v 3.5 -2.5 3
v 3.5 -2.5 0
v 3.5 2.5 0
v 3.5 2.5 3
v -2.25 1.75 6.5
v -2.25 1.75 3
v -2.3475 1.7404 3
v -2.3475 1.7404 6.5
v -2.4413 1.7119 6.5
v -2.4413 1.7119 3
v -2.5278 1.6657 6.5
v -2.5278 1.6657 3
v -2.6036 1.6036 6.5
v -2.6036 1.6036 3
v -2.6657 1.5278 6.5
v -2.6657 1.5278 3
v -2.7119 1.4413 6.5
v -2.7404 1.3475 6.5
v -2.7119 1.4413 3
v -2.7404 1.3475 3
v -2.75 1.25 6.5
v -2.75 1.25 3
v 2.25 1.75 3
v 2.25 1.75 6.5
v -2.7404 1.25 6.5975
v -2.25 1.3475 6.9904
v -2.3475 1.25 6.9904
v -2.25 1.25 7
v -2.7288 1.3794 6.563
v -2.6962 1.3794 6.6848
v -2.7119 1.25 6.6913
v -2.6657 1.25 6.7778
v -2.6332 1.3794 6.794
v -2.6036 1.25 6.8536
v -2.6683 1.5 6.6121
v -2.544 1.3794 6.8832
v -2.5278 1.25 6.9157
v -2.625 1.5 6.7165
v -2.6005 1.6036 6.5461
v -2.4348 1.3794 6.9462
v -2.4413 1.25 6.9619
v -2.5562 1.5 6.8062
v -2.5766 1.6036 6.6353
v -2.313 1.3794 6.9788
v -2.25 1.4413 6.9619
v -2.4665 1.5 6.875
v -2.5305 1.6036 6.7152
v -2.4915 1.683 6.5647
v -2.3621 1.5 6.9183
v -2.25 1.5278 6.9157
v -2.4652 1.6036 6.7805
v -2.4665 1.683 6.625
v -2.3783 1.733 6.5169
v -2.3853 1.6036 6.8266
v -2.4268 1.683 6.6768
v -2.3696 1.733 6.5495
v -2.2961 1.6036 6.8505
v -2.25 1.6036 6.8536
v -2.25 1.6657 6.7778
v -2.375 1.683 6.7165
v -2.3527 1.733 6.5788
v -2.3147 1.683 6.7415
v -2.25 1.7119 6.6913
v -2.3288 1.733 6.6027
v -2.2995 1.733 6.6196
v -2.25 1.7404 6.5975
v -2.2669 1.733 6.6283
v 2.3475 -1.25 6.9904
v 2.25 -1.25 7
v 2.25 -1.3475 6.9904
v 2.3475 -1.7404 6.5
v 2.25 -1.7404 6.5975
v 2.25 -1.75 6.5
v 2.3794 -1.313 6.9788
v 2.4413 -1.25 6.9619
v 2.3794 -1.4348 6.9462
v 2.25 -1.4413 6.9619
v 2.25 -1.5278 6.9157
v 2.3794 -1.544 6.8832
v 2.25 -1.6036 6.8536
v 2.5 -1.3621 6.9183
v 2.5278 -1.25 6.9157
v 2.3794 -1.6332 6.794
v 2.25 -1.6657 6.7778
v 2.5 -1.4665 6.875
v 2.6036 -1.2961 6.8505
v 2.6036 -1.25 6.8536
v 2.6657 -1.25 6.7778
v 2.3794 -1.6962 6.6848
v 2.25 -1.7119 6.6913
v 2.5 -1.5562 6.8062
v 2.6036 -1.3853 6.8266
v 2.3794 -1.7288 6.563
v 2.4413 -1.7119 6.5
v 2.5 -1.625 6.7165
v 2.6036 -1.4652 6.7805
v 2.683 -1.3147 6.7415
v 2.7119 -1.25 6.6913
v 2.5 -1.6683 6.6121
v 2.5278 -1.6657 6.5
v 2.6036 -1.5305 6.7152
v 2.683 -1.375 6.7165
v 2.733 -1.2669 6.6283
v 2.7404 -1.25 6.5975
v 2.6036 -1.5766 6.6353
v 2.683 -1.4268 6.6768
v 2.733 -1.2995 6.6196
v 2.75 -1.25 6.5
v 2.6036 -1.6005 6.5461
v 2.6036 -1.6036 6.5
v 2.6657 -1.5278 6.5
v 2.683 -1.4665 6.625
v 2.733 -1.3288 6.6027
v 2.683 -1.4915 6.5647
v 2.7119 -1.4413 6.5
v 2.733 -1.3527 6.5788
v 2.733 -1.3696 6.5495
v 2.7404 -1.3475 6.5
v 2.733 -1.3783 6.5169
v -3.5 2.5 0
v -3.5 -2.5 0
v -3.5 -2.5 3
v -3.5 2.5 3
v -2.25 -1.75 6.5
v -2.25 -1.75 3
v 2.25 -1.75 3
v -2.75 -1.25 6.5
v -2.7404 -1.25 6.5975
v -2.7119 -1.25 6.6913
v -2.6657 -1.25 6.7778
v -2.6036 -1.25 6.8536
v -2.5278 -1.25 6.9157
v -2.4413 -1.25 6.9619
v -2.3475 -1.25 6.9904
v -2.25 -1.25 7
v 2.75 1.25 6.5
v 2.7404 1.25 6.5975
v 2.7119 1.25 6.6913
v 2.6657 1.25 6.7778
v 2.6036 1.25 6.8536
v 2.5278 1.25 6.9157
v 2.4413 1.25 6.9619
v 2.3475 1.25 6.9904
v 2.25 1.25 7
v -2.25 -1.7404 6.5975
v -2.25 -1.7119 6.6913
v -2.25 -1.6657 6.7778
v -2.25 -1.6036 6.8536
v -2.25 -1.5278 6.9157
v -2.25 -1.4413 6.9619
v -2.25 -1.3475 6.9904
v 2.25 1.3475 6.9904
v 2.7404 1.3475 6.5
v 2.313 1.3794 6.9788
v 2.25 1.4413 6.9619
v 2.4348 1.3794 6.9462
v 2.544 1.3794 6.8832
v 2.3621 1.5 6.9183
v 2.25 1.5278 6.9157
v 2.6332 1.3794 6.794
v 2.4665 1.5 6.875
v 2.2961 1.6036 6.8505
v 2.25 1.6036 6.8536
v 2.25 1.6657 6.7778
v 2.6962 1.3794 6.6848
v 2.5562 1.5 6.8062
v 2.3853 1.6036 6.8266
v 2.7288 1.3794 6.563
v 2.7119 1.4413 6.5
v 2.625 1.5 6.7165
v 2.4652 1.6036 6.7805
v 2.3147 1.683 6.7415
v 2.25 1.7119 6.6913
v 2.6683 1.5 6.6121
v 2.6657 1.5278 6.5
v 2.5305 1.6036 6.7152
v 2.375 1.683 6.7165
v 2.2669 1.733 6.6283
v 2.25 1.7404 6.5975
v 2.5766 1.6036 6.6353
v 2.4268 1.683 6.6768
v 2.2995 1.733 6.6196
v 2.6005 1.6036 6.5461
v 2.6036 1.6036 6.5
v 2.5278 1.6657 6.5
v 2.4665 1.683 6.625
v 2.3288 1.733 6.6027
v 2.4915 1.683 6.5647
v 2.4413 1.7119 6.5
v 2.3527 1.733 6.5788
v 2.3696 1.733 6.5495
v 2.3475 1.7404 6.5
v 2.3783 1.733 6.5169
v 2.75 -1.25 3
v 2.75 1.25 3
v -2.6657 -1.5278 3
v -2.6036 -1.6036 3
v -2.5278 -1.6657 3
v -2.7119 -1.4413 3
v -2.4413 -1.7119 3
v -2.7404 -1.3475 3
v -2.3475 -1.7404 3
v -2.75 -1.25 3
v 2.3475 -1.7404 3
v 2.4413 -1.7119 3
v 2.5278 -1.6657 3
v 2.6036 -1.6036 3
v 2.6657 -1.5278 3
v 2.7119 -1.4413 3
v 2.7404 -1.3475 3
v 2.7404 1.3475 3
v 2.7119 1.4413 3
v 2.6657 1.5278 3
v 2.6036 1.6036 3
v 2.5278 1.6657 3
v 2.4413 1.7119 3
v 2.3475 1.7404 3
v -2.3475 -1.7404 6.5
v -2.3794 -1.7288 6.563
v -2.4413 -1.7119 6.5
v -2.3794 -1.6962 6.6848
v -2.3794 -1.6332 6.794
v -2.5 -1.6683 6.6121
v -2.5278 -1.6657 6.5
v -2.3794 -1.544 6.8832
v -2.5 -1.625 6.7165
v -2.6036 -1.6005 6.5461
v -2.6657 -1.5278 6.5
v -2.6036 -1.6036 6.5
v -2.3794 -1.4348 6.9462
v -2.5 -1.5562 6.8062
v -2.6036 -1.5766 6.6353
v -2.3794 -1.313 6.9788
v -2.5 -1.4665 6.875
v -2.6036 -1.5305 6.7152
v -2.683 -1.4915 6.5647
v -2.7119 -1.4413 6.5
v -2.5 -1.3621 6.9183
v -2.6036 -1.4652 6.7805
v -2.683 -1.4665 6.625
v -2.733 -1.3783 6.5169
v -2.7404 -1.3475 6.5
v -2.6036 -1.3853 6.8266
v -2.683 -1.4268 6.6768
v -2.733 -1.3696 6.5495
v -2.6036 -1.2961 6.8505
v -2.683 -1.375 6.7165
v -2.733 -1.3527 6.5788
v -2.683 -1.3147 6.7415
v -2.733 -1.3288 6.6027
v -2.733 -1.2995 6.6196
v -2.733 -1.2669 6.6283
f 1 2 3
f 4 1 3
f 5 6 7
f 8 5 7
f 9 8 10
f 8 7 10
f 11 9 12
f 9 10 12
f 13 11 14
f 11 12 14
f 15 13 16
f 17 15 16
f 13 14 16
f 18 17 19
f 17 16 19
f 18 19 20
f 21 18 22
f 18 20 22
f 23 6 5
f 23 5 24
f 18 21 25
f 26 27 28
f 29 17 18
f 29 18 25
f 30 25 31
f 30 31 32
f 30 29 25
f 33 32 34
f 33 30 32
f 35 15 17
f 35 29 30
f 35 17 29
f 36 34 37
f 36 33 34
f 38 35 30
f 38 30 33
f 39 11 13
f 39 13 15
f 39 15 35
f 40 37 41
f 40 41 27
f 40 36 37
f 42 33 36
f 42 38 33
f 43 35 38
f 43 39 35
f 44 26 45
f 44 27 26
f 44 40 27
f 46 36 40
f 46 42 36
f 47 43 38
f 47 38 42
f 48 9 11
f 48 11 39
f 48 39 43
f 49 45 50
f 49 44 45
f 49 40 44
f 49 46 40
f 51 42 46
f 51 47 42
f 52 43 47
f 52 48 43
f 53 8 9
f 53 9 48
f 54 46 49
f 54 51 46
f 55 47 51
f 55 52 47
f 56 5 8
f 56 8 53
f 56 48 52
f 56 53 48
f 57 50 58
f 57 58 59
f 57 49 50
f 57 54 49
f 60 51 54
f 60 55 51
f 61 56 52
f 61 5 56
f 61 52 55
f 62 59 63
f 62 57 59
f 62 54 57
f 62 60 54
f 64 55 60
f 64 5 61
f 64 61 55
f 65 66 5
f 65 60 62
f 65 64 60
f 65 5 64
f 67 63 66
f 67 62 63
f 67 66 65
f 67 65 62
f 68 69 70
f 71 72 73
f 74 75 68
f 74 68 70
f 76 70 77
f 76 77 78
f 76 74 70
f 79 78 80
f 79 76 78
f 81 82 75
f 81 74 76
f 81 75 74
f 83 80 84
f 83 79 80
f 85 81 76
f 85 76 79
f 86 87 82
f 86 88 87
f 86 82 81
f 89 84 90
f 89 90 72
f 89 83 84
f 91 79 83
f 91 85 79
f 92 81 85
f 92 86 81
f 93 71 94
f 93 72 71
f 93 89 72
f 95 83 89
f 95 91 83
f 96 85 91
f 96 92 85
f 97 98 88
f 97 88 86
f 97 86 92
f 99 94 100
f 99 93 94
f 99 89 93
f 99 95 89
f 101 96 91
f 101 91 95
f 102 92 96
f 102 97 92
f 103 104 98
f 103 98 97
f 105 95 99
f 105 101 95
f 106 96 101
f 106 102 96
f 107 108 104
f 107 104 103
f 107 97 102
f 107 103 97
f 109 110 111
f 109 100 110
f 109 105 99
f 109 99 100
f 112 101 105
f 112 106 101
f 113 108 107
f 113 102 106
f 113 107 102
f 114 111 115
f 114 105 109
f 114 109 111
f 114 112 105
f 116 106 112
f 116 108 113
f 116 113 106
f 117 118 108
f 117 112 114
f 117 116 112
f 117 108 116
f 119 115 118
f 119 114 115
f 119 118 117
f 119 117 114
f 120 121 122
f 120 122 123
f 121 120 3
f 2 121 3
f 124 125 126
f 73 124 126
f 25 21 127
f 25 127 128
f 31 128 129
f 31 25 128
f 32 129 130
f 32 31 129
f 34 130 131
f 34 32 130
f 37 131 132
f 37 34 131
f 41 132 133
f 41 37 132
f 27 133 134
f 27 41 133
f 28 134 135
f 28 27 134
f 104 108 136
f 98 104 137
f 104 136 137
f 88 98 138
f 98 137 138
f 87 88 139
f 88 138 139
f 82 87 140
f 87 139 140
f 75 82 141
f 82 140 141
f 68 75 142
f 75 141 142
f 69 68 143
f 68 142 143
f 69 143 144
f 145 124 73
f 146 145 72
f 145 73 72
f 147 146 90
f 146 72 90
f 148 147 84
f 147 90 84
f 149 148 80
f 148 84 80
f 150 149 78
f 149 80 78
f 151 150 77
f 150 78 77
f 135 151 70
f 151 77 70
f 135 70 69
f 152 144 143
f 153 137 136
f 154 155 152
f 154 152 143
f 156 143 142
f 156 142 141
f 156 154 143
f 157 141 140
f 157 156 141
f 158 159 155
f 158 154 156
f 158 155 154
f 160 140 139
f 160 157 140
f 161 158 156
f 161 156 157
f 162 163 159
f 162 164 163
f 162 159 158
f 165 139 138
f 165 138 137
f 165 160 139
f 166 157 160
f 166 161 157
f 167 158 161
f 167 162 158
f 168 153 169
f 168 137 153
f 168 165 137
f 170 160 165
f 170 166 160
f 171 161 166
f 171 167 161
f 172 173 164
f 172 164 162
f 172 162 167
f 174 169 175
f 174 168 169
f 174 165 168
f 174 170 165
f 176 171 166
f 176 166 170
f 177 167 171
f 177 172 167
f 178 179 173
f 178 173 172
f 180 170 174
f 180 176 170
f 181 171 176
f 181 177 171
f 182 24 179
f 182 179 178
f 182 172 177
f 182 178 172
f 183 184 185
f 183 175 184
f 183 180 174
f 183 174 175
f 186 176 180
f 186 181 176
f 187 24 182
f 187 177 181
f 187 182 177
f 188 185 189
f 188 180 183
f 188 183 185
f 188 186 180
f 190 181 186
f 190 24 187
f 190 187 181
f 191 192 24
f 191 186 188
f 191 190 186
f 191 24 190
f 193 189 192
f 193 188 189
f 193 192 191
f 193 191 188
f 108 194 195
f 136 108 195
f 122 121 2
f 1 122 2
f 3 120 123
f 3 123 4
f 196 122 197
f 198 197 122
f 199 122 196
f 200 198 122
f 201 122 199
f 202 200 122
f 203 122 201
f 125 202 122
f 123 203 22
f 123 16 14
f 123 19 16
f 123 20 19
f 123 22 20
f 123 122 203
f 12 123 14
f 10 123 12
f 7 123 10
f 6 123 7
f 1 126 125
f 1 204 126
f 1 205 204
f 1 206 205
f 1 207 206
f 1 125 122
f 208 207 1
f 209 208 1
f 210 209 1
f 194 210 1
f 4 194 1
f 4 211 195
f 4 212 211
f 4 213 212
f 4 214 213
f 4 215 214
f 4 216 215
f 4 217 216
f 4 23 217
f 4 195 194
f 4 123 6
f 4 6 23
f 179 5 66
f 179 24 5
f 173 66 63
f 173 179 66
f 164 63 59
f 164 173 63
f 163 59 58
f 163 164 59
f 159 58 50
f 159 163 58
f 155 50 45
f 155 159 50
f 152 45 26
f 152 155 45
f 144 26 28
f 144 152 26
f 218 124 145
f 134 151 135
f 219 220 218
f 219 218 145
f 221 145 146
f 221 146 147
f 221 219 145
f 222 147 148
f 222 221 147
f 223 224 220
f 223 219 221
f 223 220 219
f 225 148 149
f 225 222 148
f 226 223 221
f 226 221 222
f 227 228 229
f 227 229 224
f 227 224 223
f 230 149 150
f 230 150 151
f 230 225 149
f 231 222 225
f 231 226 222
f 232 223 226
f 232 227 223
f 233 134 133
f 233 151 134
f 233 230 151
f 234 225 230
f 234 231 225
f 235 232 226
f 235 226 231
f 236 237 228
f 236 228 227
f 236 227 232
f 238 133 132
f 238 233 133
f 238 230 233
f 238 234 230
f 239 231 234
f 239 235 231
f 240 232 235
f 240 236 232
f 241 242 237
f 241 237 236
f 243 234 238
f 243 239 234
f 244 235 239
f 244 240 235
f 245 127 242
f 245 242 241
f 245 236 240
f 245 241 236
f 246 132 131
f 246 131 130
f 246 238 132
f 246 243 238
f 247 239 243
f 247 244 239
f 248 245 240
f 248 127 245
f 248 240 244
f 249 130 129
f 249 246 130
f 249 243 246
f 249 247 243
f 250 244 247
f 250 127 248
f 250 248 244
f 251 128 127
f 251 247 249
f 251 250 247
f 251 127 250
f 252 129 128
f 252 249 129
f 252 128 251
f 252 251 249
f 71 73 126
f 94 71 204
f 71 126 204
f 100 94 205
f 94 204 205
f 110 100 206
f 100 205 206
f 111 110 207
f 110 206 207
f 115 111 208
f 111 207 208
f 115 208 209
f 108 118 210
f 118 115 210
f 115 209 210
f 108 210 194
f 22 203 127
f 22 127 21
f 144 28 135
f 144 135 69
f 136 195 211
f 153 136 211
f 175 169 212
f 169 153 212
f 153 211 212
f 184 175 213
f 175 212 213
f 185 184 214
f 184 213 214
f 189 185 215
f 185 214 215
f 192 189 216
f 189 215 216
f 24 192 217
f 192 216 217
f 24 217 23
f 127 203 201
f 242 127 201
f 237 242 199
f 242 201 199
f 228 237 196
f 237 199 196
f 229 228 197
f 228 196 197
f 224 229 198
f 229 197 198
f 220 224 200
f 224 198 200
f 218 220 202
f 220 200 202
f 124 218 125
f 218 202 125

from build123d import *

# Parameters (mm, degrees)
SKETCH_1_W      = 7
SKETCH_1_H      = 5
EXTRUDE_1_DEPTH = 3
SKETCH_2_W      = 5.5
SKETCH_2_H      = 3.5
EXTRUDE_2_DEPTH = 4
FILLET_1_R      = 0.5
FILLET_2_R      = 0.5


with BuildPart() as part:
    # 草图1 → 凸台-拉伸1 (new body)
    with BuildSketch(Plane.XY):
        Rectangle(SKETCH_1_W, SKETCH_1_H)
    extrude(amount=EXTRUDE_1_DEPTH)

    # 草图2 → 凸台-拉伸2 (add)
    with BuildSketch(Plane.XY.offset(3)):
        Rectangle(SKETCH_2_W, SKETCH_2_H)
    extrude(amount=EXTRUDE_2_DEPTH)

    # 圆角1
    fillet_1_edges = [part.edges().sort_by_distance(p)[0] for p in [
        (2.75, 0, 7),
        (0, 1.75, 7),
        (-2.75, 0, 7),
        (0, -1.75, 7),
    ]]
    fillet(fillet_1_edges, radius=FILLET_1_R)

    # 圆角2
    # the kernel refuses this fillet: 0.5 mm, written as the material it takes off along each edge
    with BuildSketch(Plane(origin=(-2.25, 1.25, 6.5), x_dir=(-1, 0, 0), z_dir=(0, 1, 0))) as fillet_2_piece_1_section:
        Polygon((0, 0), (FILLET_2_R, 0), (FILLET_2_R, FILLET_2_R), (0, FILLET_2_R), align=None)
    fillet_2_piece_1 = extrude(amount=FILLET_2_R, mode=Mode.PRIVATE)
    fillet_2_piece_1 = fillet_2_piece_1 - Plane(origin=(-2.25, 1.25, 6.5), x_dir=(0.7071067811865475, 0, -0.7071067811865475), z_dir=(0, 1, 0)) * Sphere(FILLET_2_R, mode=Mode.PRIVATE)
    add(fillet_2_piece_1, mode=Mode.SUBTRACT)
    with BuildSketch(Plane(origin=(2.25, 1.25, 6.5), x_dir=(1, 0, 0), z_dir=(0, 1, 0))) as fillet_2_piece_2_section:
        Polygon((0, 0), (FILLET_2_R, 0), (FILLET_2_R, -FILLET_2_R), (0, -FILLET_2_R), align=None)
    fillet_2_piece_2 = extrude(amount=FILLET_2_R, mode=Mode.PRIVATE)
    fillet_2_piece_2 = fillet_2_piece_2 - Plane(origin=(2.25, 1.25, 6.5), x_dir=(-0.7071067811865475, 0, -0.7071067811865475), z_dir=(0, 1, 0)) * Sphere(FILLET_2_R, mode=Mode.PRIVATE)
    add(fillet_2_piece_2, mode=Mode.SUBTRACT)
    with BuildSketch(Plane(origin=(-2.25, -1.25, 6.5), x_dir=(0, -1, 0), z_dir=(-1, 0, 0))) as fillet_2_piece_3_section:
        Polygon((0, 0), (FILLET_2_R, 0), (FILLET_2_R, FILLET_2_R), (0, FILLET_2_R), align=None)
    fillet_2_piece_3 = extrude(amount=FILLET_2_R, mode=Mode.PRIVATE)
    fillet_2_piece_3 = fillet_2_piece_3 - Plane(origin=(-2.25, -1.25, 6.5), x_dir=(0, 0.7071067811865475, -0.7071067811865475), z_dir=(-1, 0, 0)) * Sphere(FILLET_2_R, mode=Mode.PRIVATE)
    add(fillet_2_piece_3, mode=Mode.SUBTRACT)
    with BuildSketch(Plane(origin=(2.25, -1.25, 6.5), x_dir=(0, -1, 0), z_dir=(1, 0, 0))) as fillet_2_piece_4_section:
        Polygon((0, 0), (FILLET_2_R, 0), (FILLET_2_R, -FILLET_2_R), (0, -FILLET_2_R), align=None)
    fillet_2_piece_4 = extrude(amount=FILLET_2_R, mode=Mode.PRIVATE)
    fillet_2_piece_4 = fillet_2_piece_4 - Plane(origin=(2.25, -1.25, 6.5), x_dir=(0, 0.7071067811865475, -0.7071067811865475), z_dir=(1, 0, 0)) * Sphere(FILLET_2_R, mode=Mode.PRIVATE)
    add(fillet_2_piece_4, mode=Mode.SUBTRACT)
    with BuildSketch(Plane(origin=(2.75, -1.75, 3), x_dir=(0, 1, 0), z_dir=(0, 0, 1)), Plane(origin=(2.75, 1.75, 3), x_dir=(-1, 0, 0), z_dir=(0, 0, 1))) as fillet_2_piece_5:
        with BuildLine():
            CenterArc((FILLET_2_R, FILLET_2_R), FILLET_2_R, 180, 90)
            Line((0, FILLET_2_R), (0, 0))
            Line((0, 0), (FILLET_2_R, 0))
        make_face()
    extrude(amount=3.5, mode=Mode.SUBTRACT)
    with BuildSketch(Plane(origin=(-2.75, -1.75, 3), x_dir=(0, 1, 0), z_dir=(0, 0, 1)), Plane(origin=(-2.75, 1.75, 3), x_dir=(1, 0, 0), z_dir=(0, 0, 1))) as fillet_2_piece_6:
        with BuildLine():
            CenterArc((FILLET_2_R, -FILLET_2_R), FILLET_2_R, 90, 90)
            Line((0, -FILLET_2_R), (0, 0))
            Line((0, 0), (FILLET_2_R, 0))
        make_face()
    extrude(amount=3.5, mode=Mode.SUBTRACT)


solid = part.part
